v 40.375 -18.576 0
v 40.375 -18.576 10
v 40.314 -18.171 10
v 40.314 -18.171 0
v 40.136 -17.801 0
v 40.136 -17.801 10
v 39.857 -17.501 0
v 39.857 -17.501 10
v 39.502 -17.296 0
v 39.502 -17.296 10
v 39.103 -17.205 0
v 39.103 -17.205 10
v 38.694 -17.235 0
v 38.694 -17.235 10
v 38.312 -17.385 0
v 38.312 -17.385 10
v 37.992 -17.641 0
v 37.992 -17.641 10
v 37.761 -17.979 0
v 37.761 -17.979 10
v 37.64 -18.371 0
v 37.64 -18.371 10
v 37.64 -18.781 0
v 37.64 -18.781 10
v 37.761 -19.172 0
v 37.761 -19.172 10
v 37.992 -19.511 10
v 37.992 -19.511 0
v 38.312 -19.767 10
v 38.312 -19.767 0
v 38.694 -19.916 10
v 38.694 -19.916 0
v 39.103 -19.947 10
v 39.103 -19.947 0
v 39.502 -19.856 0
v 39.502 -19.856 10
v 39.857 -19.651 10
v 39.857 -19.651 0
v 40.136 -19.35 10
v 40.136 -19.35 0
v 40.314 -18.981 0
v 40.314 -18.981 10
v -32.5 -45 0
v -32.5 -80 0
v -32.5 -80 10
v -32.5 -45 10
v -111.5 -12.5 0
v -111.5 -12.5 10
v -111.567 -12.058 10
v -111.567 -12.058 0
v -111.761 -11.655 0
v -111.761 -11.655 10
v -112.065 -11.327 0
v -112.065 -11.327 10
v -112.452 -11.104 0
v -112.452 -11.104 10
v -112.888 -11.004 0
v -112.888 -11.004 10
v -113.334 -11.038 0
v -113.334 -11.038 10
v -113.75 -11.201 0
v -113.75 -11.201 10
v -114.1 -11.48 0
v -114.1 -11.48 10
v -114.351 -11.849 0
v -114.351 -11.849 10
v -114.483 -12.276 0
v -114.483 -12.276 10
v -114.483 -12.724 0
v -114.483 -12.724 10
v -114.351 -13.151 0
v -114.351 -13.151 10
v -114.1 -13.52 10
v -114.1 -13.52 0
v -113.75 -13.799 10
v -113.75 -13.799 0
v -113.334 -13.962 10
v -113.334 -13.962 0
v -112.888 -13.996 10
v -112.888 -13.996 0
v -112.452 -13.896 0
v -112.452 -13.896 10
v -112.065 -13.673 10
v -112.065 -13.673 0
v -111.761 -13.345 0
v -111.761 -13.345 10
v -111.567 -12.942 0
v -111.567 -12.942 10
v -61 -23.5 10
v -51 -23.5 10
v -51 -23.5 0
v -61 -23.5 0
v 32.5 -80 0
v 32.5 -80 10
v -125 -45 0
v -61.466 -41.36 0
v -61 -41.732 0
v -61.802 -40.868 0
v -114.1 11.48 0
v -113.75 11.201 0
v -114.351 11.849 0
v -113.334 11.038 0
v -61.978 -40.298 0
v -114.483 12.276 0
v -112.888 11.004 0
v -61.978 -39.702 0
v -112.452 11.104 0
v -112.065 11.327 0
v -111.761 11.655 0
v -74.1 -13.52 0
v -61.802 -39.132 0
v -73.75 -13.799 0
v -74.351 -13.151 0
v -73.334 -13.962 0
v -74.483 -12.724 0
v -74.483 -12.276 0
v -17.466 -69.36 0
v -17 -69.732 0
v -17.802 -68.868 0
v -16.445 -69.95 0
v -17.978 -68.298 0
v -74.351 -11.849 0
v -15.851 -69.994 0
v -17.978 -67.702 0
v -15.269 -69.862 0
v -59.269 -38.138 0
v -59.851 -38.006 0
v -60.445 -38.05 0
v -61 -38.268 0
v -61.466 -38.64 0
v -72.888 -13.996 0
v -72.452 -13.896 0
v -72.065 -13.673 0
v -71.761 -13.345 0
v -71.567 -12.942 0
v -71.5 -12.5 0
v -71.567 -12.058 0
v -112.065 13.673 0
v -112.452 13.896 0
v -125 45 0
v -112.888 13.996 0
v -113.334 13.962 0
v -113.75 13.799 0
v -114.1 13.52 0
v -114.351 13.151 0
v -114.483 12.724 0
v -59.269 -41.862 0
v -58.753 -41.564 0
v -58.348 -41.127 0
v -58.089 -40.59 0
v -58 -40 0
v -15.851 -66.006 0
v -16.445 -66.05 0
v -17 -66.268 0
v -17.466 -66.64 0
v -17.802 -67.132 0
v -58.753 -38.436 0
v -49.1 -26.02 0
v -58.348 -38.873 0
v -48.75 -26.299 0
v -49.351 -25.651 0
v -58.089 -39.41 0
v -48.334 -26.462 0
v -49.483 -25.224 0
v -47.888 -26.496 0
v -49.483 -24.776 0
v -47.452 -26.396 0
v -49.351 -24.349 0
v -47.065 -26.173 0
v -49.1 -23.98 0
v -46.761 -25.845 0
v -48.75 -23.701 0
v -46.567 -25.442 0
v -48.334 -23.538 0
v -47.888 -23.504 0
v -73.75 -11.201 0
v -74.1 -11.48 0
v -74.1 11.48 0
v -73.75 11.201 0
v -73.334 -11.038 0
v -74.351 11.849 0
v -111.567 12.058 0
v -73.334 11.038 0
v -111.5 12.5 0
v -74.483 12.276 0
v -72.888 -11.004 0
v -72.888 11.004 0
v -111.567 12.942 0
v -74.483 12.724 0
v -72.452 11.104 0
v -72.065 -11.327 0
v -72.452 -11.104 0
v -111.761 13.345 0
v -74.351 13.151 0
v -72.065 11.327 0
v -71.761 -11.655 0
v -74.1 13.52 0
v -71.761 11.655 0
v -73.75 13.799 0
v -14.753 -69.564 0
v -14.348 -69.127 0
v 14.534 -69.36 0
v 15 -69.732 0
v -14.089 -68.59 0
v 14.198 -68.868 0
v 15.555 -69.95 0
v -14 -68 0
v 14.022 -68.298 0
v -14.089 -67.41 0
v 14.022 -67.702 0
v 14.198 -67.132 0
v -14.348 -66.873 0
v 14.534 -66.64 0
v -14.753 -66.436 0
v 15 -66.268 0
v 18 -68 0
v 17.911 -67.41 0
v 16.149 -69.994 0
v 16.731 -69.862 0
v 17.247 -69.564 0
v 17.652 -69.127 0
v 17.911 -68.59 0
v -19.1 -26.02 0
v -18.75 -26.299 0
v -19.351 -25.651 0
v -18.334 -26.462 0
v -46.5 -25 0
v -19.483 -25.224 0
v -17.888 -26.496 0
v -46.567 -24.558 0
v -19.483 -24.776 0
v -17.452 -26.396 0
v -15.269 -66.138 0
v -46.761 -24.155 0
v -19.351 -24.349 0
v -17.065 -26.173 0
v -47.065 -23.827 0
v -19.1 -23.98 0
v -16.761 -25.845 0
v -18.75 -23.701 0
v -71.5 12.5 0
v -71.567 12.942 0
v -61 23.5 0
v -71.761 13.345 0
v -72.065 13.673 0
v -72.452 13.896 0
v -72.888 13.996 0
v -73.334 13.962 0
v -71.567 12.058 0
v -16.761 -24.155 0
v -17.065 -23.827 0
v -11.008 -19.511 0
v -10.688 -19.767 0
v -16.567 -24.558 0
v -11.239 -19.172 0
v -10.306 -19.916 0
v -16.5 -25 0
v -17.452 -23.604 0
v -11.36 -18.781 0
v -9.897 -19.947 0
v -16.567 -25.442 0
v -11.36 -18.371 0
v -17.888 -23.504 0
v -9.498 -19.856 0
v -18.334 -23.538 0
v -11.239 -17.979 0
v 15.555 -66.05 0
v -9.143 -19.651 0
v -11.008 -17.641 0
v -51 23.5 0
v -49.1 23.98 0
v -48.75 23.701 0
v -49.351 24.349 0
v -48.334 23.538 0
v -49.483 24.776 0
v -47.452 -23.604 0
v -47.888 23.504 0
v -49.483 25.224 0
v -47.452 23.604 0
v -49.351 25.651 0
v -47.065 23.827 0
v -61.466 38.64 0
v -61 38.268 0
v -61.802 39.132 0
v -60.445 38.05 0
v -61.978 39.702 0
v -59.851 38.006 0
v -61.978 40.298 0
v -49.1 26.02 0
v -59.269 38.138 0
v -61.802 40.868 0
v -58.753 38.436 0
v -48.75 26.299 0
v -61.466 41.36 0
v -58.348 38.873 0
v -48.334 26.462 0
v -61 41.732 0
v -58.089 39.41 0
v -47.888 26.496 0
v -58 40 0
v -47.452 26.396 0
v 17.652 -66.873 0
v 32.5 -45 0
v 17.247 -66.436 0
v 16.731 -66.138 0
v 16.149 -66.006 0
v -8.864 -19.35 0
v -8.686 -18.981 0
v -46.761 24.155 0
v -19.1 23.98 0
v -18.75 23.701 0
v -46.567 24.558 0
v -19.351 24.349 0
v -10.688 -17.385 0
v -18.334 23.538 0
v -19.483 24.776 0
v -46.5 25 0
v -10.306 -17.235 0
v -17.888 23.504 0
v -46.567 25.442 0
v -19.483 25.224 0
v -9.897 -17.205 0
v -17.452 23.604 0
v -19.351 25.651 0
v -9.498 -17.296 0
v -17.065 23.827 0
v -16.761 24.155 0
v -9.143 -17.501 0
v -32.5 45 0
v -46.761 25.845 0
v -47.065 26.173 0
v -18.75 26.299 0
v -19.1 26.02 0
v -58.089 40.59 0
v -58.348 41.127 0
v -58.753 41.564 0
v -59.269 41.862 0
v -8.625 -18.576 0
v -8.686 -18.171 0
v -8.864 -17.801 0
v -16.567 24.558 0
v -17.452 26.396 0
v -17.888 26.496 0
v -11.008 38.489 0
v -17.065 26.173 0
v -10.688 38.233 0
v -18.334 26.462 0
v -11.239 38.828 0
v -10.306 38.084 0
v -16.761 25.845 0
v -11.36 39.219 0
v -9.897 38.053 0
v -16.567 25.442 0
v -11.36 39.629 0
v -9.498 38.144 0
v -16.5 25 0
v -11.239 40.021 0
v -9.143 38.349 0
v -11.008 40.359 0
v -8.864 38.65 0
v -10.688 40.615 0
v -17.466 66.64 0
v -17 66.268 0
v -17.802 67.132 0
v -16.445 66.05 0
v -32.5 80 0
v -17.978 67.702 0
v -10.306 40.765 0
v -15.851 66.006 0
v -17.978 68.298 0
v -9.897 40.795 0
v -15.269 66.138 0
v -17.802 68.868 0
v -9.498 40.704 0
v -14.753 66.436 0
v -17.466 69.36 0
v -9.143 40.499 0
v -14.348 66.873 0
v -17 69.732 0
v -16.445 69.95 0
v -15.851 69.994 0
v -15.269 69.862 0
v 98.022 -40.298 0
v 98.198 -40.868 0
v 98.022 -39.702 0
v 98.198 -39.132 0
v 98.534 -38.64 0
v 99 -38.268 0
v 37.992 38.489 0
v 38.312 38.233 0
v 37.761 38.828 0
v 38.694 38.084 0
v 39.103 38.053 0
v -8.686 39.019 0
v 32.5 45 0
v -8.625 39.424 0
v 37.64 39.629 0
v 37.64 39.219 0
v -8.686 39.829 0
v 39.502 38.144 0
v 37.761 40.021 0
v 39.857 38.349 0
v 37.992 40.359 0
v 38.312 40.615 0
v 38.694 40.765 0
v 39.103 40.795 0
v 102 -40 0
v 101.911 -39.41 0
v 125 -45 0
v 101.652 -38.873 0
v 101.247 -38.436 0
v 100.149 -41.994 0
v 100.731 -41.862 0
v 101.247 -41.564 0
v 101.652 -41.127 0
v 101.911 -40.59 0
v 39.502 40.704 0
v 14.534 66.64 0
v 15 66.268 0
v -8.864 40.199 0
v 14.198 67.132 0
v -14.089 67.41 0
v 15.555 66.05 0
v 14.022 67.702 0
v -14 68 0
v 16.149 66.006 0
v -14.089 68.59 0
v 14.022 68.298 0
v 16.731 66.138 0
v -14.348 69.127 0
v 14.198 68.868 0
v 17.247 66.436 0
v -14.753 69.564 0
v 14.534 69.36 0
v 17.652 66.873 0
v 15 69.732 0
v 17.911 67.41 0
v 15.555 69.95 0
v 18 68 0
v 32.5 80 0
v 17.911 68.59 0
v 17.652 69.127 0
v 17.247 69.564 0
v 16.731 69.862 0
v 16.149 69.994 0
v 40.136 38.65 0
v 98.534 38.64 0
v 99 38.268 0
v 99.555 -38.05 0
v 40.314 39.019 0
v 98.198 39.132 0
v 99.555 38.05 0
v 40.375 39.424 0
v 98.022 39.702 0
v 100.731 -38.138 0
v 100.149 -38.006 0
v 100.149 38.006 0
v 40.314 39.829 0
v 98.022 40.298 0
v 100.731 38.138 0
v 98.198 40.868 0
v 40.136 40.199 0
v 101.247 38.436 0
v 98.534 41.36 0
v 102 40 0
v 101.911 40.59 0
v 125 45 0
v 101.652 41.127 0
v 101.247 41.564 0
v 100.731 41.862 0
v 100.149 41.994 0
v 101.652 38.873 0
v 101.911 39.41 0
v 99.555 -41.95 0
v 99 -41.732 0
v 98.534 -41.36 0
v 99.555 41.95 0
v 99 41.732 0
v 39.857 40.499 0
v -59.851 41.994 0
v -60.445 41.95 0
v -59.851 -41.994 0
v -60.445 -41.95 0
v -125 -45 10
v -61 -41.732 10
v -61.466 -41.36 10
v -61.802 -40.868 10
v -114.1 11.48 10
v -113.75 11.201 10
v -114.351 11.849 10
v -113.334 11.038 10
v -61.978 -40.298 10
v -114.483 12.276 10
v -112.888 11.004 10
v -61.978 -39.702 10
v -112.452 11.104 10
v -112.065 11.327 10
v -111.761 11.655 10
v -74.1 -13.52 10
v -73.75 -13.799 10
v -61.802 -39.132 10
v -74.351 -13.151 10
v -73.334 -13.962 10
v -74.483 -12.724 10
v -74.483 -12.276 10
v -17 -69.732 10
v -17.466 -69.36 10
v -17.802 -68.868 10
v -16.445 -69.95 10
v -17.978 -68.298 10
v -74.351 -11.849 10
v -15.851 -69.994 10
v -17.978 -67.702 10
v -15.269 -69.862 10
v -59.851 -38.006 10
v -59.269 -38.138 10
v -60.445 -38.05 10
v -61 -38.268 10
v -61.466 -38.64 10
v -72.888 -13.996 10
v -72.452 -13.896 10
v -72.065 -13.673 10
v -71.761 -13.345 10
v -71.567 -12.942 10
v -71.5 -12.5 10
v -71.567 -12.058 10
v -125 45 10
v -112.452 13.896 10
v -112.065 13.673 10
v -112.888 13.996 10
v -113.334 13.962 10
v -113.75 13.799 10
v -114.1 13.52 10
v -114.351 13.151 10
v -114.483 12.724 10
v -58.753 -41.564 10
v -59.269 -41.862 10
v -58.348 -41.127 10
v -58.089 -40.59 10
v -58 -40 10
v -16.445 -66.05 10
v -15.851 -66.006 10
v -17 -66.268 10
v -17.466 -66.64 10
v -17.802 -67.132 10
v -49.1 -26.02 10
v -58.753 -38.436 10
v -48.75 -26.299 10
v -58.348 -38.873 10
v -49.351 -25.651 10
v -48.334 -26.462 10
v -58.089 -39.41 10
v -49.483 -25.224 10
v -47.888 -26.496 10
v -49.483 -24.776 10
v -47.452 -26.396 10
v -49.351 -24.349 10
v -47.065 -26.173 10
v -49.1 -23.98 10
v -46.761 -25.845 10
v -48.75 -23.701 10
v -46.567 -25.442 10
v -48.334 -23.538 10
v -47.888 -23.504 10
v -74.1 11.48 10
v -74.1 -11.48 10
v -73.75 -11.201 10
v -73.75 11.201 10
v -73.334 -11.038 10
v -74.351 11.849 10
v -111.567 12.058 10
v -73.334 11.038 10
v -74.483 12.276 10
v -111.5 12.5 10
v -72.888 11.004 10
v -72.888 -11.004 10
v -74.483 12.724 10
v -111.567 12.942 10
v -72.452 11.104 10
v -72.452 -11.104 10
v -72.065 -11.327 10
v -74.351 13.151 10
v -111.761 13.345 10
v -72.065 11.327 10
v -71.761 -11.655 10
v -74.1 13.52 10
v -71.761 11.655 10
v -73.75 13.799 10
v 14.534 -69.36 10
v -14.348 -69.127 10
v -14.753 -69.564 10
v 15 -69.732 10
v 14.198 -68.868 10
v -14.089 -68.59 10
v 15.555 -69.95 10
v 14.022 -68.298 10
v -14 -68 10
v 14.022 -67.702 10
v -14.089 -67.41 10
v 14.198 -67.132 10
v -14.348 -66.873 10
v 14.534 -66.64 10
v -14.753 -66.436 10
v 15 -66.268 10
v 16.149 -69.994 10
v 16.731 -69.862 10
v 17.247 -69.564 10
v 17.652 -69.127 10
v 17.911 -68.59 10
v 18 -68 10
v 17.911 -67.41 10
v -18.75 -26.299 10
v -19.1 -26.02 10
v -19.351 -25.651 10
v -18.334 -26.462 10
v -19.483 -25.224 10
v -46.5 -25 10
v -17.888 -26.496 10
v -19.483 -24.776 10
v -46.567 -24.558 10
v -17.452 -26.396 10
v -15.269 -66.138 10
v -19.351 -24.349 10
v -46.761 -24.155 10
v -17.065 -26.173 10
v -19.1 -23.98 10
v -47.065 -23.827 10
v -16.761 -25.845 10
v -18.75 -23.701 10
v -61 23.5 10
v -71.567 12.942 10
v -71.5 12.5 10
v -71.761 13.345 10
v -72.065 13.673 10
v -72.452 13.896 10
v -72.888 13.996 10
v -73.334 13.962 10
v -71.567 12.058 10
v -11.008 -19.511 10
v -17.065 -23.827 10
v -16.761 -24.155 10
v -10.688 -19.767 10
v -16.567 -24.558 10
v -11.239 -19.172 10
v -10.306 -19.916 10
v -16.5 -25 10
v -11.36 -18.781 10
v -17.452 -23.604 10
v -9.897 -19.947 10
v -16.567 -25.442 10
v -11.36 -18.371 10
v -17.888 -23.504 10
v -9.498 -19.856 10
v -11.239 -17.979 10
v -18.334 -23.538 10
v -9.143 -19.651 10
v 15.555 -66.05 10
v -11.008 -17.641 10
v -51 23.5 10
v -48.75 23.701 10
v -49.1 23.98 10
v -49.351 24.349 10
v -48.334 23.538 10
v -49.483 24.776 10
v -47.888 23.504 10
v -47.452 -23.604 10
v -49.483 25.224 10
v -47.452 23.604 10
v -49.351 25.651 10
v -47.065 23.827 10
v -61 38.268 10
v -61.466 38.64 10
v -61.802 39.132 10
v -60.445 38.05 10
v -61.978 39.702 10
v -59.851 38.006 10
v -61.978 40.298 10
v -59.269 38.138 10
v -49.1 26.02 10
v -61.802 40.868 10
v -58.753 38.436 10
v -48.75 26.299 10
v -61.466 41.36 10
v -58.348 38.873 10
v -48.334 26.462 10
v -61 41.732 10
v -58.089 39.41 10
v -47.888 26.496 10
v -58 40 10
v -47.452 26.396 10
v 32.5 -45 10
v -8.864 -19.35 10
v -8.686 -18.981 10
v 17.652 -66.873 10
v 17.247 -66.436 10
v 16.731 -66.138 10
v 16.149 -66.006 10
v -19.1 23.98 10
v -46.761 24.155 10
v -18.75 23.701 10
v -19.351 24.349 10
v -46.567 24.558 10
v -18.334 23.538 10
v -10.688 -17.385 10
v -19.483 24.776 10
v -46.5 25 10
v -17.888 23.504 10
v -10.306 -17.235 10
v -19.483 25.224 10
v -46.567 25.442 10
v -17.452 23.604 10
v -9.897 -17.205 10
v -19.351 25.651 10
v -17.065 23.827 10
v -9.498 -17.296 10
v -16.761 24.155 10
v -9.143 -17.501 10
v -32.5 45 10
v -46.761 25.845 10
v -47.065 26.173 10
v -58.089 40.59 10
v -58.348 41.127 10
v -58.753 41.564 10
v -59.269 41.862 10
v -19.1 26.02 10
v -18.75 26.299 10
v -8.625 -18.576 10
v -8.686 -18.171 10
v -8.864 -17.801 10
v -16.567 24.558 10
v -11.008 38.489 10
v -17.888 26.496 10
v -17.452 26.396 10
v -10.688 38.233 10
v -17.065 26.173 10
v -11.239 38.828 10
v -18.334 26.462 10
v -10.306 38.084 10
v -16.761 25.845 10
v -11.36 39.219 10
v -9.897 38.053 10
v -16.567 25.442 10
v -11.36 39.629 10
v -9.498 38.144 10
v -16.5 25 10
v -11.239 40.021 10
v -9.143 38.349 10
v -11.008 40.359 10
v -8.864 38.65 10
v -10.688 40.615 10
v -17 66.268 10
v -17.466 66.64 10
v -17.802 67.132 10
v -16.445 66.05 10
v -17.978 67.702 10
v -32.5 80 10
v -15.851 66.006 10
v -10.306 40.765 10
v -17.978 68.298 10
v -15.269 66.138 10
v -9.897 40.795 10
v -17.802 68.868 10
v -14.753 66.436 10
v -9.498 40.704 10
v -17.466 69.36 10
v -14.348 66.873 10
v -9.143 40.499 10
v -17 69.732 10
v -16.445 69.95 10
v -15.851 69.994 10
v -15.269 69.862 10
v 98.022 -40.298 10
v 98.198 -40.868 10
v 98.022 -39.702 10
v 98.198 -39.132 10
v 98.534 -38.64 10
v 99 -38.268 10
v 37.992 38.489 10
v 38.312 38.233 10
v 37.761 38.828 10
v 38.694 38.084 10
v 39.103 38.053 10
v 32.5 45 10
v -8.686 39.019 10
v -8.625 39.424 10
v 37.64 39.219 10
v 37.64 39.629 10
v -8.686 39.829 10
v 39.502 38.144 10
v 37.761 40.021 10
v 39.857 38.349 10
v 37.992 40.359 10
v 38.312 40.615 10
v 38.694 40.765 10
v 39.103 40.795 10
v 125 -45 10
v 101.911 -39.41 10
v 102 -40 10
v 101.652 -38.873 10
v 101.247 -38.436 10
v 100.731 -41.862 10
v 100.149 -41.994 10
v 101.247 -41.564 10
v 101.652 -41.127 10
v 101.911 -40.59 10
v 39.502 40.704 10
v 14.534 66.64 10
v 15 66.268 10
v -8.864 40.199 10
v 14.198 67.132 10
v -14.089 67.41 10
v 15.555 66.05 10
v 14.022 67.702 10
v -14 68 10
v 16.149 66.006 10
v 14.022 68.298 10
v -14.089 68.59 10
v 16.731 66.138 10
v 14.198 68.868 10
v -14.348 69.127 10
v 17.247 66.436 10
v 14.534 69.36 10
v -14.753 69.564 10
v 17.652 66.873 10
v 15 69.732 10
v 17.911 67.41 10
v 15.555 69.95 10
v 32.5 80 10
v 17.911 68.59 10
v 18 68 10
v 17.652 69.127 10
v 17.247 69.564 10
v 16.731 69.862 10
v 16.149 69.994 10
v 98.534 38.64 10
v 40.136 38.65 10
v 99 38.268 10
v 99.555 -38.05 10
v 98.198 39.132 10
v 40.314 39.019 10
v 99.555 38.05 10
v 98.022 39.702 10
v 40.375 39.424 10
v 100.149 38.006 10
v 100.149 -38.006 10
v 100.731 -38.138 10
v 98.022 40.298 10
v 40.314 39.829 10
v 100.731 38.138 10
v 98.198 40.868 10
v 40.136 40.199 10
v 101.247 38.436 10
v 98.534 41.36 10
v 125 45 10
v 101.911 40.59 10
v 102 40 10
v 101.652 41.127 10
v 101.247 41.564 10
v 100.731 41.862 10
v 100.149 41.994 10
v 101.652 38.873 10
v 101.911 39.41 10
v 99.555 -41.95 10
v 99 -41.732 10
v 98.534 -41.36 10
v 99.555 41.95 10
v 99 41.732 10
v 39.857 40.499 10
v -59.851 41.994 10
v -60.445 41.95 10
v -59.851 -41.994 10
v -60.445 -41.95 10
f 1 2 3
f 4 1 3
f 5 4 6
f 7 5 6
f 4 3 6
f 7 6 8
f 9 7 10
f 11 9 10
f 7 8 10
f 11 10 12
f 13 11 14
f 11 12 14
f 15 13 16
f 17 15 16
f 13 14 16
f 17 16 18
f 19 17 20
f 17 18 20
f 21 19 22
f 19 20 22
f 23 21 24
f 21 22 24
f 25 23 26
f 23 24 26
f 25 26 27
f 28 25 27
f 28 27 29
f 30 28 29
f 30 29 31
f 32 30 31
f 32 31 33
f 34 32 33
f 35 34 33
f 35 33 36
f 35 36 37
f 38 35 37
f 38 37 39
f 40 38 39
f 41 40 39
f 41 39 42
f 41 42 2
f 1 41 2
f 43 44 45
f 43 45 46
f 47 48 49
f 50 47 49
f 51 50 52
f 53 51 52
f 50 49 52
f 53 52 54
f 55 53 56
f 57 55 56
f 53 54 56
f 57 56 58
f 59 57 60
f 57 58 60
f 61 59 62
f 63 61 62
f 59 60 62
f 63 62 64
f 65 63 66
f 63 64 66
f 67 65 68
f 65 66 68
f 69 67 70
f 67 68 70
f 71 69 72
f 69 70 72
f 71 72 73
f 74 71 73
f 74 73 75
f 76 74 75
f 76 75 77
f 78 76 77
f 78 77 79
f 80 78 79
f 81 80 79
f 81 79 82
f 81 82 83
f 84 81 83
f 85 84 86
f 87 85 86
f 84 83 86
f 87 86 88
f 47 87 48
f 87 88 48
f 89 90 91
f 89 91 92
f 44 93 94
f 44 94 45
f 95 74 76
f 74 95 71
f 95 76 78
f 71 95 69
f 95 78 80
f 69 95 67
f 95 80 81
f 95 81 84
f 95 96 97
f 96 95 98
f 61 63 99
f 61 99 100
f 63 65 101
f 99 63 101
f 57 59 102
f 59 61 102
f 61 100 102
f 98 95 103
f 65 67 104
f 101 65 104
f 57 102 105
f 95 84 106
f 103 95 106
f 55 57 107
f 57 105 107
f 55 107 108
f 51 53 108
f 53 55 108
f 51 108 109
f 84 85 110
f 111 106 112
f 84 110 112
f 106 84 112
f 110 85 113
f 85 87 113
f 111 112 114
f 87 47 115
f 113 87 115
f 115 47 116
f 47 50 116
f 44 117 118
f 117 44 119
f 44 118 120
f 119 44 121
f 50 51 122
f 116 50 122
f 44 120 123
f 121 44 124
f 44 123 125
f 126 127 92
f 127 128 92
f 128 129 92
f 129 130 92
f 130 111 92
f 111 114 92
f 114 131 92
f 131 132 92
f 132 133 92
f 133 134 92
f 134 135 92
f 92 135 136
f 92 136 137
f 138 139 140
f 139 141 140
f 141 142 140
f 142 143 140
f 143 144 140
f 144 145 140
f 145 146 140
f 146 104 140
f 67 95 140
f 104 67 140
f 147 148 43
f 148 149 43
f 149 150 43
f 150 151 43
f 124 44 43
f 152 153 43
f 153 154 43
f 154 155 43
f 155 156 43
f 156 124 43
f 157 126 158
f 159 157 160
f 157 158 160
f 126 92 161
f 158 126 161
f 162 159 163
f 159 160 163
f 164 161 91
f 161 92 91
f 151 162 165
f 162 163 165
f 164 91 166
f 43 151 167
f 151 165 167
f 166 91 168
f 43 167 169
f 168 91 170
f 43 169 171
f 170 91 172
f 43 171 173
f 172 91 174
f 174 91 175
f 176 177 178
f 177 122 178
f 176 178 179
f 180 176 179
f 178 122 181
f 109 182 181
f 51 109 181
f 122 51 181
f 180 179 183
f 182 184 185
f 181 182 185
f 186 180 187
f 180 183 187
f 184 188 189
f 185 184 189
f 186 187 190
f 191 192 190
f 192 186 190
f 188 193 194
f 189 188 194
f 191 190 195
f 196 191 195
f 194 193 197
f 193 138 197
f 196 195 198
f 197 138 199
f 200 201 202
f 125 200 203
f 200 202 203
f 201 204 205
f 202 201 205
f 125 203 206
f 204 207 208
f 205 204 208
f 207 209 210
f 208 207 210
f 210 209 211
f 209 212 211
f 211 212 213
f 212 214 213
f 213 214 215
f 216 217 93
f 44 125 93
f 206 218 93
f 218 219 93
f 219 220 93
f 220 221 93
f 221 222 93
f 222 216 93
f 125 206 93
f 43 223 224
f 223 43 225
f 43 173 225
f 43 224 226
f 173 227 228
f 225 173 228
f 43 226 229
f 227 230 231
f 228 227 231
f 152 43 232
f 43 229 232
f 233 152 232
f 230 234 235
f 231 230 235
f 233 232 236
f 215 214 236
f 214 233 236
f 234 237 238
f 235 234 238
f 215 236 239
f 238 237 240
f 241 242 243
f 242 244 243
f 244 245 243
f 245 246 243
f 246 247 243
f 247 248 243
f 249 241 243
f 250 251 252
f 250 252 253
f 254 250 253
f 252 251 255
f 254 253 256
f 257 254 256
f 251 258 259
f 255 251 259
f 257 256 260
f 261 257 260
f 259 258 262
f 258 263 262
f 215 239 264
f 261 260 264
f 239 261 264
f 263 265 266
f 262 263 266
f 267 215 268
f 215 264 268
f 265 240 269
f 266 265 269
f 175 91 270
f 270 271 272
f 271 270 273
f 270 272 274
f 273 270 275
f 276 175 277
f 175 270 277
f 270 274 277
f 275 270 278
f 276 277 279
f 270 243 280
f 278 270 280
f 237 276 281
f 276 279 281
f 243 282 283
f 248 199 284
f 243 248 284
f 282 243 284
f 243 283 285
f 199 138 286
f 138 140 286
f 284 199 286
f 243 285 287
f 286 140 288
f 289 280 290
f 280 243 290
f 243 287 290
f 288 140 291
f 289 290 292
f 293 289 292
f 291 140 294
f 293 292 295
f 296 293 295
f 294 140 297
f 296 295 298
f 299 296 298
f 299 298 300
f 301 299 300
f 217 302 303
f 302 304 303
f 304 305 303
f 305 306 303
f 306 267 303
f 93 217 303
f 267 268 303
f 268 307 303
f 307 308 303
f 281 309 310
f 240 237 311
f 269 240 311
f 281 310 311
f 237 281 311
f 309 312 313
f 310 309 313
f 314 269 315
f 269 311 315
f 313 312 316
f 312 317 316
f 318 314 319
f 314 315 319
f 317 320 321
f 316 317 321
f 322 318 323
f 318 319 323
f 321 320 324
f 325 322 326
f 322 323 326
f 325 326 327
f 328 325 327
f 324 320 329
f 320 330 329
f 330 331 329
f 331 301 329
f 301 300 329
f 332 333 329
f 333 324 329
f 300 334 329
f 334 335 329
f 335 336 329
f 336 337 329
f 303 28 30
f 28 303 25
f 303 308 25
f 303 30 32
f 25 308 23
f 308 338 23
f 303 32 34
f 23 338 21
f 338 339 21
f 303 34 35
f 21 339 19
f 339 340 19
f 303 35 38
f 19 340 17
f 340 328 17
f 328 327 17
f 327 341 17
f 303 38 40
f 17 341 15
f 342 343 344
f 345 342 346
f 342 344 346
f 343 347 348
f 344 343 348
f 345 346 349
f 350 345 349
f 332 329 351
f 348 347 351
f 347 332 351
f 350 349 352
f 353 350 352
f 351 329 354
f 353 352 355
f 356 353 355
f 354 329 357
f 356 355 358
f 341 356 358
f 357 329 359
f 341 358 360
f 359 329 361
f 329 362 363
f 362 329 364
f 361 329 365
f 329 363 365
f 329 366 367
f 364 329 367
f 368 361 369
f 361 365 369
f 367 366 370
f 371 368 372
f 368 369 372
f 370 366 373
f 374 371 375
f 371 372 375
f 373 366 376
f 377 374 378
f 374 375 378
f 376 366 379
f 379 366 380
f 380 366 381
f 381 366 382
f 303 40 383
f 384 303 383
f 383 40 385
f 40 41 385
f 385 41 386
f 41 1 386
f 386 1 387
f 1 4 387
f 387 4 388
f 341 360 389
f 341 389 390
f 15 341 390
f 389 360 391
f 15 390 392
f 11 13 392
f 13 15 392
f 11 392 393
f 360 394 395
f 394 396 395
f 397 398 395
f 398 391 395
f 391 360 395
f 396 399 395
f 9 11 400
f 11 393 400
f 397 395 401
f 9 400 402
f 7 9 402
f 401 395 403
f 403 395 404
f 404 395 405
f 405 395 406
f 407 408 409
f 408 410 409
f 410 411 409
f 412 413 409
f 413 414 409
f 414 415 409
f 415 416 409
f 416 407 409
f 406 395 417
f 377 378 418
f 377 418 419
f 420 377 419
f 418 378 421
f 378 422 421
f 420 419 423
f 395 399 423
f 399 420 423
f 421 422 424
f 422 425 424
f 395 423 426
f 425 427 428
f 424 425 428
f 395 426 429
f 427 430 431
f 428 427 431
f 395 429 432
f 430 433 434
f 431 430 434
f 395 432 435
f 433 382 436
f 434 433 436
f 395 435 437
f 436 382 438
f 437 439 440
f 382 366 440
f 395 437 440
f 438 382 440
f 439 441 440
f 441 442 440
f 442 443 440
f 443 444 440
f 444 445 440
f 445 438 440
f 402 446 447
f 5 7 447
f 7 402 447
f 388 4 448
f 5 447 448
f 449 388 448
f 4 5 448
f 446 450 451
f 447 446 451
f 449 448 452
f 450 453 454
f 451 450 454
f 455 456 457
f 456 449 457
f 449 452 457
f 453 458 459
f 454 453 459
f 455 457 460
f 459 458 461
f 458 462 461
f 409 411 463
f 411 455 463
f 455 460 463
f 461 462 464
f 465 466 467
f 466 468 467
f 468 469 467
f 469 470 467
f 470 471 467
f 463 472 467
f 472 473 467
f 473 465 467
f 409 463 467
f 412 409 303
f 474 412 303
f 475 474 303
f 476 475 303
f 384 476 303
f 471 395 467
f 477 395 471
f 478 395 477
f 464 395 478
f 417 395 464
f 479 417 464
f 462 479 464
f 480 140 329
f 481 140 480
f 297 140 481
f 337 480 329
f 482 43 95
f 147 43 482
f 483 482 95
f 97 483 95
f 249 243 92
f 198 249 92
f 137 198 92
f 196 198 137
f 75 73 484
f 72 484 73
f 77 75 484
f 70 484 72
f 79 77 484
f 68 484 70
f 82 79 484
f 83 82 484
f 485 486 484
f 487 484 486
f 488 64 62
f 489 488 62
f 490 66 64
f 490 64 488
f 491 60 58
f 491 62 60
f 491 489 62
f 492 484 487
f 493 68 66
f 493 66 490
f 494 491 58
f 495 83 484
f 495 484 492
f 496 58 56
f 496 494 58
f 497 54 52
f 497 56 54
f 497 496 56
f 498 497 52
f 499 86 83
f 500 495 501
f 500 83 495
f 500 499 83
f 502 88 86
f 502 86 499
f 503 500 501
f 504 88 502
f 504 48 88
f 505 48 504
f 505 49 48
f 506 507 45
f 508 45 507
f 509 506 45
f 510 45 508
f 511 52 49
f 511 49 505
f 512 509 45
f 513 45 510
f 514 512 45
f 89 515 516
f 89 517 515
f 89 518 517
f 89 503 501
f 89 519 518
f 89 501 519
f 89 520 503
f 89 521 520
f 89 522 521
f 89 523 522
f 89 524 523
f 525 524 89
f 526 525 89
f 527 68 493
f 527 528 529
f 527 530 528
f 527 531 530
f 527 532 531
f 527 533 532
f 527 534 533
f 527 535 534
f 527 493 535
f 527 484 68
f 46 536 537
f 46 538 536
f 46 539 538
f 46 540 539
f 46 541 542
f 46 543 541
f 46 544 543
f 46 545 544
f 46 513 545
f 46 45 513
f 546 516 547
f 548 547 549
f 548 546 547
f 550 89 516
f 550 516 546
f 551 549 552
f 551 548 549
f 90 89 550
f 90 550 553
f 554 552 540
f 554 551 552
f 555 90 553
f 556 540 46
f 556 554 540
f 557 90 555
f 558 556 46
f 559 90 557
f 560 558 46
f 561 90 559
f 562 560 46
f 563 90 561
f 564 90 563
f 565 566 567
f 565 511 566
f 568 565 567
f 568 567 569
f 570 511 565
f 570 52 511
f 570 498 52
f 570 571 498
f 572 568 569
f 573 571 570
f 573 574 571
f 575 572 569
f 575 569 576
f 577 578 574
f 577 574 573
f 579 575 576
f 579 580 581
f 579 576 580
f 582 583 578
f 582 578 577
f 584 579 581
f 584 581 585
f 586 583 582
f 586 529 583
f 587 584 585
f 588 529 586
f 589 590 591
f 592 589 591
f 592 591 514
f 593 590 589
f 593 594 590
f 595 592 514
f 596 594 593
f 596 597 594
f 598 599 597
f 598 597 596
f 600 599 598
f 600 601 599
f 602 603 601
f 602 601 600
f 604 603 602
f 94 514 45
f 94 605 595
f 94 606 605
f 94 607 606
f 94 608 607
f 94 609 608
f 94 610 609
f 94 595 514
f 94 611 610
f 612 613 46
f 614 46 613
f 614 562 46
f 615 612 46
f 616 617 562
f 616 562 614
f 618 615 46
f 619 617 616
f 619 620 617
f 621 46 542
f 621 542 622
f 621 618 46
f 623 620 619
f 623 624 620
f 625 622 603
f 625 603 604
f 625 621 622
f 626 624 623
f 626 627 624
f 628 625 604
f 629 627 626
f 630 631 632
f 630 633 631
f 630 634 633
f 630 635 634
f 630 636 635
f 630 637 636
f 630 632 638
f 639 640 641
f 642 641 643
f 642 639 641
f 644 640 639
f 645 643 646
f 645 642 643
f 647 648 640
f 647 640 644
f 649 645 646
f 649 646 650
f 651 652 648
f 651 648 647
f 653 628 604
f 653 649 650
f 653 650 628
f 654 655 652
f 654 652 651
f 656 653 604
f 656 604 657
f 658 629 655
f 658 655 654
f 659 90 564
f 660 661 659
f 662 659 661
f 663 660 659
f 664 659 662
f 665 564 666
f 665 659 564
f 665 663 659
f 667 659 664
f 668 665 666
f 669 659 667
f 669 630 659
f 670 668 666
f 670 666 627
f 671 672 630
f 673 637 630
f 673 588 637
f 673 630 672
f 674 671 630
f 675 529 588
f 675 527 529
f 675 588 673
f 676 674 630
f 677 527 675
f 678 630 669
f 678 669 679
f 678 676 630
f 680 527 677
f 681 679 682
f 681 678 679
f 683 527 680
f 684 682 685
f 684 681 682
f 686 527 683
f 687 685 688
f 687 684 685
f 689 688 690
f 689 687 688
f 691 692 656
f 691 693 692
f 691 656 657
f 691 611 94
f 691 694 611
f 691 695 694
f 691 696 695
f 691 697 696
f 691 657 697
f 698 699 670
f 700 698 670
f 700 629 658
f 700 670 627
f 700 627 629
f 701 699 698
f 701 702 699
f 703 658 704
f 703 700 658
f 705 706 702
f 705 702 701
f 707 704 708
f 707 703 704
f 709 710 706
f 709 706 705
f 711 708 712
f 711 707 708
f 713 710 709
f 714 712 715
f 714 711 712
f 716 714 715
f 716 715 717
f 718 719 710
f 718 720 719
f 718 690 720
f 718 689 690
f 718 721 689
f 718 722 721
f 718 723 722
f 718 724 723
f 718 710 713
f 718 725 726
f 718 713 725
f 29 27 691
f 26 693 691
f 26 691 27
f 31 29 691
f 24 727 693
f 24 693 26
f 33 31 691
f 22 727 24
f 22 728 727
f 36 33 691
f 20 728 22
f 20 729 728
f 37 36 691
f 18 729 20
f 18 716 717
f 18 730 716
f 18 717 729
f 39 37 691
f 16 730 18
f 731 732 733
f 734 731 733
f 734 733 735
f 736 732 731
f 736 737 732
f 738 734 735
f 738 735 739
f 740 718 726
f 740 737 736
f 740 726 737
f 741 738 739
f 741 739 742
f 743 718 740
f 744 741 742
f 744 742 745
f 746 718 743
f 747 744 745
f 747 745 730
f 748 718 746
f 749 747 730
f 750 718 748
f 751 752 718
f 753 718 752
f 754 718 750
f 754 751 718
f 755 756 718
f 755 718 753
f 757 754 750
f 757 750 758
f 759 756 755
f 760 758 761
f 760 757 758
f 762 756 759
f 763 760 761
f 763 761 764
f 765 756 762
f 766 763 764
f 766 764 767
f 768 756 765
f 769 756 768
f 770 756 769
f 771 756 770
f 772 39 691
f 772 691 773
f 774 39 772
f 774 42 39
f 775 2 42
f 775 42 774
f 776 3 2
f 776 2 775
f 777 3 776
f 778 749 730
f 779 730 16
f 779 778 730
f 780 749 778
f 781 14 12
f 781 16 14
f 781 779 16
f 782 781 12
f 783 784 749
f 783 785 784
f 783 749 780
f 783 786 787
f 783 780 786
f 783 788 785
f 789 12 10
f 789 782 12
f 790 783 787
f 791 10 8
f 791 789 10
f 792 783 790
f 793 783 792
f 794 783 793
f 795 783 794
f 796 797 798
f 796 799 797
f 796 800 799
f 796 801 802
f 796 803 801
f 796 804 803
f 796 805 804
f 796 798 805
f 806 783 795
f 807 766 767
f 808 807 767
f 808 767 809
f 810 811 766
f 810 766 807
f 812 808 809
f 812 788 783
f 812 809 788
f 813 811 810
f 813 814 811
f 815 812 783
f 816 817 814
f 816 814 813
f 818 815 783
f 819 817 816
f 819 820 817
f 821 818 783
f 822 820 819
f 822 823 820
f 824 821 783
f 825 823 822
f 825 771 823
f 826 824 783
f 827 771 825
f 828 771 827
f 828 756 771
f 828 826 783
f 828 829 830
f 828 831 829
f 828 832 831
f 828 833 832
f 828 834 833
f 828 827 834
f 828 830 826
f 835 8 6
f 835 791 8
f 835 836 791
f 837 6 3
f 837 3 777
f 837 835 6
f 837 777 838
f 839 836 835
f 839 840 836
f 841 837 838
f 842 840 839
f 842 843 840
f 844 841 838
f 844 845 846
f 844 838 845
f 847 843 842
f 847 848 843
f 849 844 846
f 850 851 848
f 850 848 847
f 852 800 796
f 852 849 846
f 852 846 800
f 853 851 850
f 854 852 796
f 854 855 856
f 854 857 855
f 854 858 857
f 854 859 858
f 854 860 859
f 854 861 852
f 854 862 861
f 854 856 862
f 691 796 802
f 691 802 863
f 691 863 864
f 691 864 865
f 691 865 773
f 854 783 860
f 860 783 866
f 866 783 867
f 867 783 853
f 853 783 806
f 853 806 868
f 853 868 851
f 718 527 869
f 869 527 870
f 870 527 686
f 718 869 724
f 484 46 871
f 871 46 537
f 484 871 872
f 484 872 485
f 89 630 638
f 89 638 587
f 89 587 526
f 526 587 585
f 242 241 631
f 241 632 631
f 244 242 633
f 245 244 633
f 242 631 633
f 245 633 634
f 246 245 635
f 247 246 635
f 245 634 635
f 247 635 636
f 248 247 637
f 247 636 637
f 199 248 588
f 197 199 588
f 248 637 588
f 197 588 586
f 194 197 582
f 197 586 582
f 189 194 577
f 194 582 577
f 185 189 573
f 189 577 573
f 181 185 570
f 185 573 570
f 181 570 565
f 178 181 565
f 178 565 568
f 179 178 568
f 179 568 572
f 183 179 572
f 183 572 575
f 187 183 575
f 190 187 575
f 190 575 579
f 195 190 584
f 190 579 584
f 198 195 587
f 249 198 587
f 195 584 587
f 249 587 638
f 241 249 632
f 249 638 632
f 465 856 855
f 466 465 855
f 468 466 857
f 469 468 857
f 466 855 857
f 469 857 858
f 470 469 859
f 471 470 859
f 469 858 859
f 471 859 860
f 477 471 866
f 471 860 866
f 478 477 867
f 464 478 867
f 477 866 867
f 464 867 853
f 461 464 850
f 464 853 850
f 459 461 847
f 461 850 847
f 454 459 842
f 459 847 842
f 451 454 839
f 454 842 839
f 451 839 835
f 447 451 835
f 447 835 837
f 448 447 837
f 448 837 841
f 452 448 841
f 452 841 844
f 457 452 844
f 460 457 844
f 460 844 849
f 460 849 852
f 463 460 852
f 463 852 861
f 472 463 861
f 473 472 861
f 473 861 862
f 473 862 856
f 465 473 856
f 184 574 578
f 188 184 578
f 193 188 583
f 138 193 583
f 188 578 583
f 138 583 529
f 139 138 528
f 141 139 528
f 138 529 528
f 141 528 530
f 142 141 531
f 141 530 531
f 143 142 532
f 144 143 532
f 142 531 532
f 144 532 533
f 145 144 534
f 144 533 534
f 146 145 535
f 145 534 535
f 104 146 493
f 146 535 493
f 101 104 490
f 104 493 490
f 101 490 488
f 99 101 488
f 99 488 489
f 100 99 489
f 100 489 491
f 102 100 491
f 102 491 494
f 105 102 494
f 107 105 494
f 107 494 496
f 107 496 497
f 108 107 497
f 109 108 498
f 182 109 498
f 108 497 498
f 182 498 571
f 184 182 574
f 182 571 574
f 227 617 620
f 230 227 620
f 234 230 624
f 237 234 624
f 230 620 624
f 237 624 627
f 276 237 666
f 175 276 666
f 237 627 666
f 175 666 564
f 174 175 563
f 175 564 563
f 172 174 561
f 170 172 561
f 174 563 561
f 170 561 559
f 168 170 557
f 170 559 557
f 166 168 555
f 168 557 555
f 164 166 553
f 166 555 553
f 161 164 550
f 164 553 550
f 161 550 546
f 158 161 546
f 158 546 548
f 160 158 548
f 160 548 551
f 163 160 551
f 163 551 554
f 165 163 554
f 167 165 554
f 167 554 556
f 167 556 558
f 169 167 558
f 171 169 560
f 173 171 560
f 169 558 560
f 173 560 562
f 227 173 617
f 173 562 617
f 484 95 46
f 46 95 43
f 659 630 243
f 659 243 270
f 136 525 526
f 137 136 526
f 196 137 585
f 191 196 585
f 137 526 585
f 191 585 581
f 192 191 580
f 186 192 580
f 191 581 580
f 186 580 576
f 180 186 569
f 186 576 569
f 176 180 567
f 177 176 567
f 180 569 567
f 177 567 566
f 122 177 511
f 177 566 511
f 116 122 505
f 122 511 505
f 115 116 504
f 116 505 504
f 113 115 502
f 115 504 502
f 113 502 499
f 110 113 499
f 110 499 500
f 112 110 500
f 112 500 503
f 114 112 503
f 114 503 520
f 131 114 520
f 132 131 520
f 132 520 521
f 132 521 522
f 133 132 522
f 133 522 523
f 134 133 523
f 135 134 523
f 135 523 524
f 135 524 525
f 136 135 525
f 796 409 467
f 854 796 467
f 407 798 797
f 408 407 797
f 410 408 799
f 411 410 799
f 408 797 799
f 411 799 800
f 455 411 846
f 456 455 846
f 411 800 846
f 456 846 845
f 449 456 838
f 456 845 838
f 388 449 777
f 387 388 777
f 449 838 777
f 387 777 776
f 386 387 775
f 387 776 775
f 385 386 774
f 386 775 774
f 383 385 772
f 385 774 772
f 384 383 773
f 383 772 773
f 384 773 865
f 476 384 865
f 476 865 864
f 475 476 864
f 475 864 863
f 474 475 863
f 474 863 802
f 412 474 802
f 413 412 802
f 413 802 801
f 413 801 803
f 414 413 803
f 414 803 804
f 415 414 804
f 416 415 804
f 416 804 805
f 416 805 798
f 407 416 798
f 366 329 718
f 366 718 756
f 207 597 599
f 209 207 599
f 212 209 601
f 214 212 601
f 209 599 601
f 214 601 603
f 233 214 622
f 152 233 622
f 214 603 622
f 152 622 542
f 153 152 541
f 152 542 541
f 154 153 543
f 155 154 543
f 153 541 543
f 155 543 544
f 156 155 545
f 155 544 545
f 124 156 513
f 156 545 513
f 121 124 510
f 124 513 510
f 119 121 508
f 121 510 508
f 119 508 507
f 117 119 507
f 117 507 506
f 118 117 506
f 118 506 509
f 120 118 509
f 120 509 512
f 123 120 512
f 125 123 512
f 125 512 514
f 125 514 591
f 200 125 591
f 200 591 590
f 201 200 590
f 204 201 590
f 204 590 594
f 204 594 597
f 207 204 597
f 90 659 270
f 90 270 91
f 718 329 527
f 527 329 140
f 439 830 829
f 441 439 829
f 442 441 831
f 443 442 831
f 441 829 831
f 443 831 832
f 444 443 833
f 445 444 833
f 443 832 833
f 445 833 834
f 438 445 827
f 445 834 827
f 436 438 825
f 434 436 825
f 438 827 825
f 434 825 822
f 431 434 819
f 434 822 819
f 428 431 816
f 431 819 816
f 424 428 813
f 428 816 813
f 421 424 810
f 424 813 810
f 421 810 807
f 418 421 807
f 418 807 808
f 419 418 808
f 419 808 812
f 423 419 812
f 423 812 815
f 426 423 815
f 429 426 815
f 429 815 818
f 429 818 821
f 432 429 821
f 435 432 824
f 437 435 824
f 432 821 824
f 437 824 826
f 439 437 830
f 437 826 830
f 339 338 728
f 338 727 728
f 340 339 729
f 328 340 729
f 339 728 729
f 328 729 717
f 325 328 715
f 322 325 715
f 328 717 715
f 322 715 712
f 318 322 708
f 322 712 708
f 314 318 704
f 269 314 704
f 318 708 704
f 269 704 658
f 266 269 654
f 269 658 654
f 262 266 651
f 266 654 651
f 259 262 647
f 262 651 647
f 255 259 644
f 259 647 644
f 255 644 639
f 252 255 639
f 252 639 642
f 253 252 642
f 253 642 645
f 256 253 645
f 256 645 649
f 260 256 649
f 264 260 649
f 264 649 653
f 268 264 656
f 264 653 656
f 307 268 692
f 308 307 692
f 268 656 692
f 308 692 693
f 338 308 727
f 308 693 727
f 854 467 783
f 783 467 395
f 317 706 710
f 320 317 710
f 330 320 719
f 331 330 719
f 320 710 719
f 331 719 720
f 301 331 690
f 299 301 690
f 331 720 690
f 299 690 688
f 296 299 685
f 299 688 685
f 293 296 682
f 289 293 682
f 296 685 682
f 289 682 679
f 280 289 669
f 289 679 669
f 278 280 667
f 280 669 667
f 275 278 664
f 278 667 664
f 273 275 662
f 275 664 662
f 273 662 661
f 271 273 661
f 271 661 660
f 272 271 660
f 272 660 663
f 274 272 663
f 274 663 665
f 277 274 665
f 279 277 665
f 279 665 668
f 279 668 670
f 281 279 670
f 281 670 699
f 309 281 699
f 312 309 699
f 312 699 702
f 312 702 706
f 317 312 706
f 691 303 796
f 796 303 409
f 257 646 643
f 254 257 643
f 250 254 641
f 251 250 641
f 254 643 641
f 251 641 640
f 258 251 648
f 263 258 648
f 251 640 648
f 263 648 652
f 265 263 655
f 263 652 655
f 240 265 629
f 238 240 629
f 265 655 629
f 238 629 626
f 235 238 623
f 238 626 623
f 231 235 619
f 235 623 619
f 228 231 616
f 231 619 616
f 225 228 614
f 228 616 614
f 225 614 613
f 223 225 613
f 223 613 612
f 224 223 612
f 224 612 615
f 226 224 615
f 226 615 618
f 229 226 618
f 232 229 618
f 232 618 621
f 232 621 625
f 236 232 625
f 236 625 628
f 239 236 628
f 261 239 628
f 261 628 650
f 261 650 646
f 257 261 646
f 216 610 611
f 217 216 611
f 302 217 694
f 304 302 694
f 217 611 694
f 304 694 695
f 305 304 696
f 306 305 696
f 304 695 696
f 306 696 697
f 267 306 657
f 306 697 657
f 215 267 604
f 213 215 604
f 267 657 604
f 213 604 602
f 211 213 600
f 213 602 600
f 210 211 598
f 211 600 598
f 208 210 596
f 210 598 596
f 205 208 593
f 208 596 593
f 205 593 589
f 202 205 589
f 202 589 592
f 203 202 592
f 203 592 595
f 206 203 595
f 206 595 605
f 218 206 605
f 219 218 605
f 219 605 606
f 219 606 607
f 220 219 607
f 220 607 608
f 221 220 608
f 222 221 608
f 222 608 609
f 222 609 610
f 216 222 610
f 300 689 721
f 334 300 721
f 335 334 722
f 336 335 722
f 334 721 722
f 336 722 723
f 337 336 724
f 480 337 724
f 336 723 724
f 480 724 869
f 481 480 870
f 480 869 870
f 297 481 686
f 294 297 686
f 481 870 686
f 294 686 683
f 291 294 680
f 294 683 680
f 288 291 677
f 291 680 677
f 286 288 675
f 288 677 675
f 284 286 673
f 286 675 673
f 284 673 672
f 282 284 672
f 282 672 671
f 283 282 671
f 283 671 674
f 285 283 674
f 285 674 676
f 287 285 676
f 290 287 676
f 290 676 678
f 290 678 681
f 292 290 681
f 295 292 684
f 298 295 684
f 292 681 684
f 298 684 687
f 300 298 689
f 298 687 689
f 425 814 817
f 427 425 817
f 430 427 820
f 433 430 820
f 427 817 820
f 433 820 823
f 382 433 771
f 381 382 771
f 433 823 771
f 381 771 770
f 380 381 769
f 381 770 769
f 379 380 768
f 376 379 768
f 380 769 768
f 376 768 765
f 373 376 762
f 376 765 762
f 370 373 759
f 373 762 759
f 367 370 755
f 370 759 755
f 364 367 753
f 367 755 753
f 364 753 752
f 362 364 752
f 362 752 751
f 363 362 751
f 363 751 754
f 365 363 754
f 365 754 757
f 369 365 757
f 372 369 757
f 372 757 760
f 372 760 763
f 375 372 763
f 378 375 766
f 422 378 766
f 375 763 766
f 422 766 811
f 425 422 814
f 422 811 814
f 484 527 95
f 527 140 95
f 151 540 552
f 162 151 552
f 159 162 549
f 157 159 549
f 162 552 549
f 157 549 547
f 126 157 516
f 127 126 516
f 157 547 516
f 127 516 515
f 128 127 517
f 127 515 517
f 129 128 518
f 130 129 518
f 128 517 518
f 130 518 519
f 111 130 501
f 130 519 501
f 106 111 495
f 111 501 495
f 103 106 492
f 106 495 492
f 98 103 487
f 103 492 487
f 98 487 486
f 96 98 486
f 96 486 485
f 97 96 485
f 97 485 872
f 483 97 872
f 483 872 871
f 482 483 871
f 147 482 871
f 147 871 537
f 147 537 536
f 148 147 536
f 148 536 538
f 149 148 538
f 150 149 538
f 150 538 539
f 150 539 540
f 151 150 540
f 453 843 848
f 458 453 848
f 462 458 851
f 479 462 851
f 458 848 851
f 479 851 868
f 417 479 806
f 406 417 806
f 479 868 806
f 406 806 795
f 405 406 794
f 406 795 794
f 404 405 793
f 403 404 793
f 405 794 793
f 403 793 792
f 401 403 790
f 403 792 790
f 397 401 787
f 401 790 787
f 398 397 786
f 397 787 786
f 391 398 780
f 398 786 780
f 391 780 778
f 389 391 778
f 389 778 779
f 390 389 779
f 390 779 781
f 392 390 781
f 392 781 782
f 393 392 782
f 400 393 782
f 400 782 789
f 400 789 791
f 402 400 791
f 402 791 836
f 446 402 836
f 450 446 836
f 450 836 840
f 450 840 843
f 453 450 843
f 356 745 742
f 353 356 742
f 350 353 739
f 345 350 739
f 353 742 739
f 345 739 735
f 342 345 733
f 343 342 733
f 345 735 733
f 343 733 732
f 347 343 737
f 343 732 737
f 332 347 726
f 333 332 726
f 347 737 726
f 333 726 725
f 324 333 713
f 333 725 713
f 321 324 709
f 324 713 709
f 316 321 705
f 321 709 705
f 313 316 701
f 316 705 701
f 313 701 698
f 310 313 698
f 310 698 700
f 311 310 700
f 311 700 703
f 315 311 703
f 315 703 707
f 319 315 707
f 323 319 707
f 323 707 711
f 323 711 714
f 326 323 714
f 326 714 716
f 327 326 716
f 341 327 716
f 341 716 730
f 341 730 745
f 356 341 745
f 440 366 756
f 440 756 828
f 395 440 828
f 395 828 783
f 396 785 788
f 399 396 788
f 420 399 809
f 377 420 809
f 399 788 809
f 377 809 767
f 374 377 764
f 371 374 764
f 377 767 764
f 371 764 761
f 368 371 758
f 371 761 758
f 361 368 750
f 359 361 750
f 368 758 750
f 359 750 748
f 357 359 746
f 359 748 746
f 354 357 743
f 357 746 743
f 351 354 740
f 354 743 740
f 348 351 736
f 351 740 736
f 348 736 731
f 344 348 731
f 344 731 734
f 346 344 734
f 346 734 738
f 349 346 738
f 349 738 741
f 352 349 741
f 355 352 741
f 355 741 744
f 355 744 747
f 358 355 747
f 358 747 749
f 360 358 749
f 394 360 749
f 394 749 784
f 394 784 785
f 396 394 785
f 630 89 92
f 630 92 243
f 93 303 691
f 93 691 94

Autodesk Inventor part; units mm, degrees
ref_plane "YZ Plane" through (0, 0, 0) normal (1, 0, 0) x (0, 1, 0)
ref_plane "XZ Plane" through (0, 0, 0) normal (0, 1, 0) x (-1, 0, 0)
ref_plane "XY Plane" through (0, 0, 0) normal (0, 0, 1) x (1, 0, 0)
sketch "Эскиз1" plane through (0, 0, 0) normal (0, 0, 1) x (1, 0, 0)
  line L0 (-125, -45) -> (125, -45)
  line L1 (125, -45) -> (125, 45)
  line L2 (125, 45) -> (-125, 45)
  line L3 (-125, 45) -> (-125, -45)
  line L4 (-125, -45) -> (125, 45) construction
  line L5 (125, -45) -> (-125, 45) construction
  line L6 (32.5, -80) -> (-32.5, -80)
  line L7 (-32.5, -80) -> (-32.5, 80)
  line L8 (-32.5, 80) -> (32.5, 80)
  line L9 (32.5, 80) -> (32.5, -80)
  line L10 (32.5, -80) -> (-32.5, 80) construction
  line L11 (-32.5, -80) -> (32.5, 80) construction
  point P0 (0, 0)
  dimension "d0" = 250
  dimension "d1" = 90
  dimension "d2" = 65
  dimension "d3" = 160
extrude "Выдавливание1" add sketch "Эскиз1" along normal blind 10
sketch "Эскиз2" plane through (0, 0, 10) normal (0, 0, 1) x (1, 0, 0)
  line L0 (16, 68) -> (-16, 68) construction
  line L1 (-16, 68) -> (-16, 80) construction
  line L2 (-16, 80) -> (16, 80) construction
  line L3 (16, 80) -> (16, 68) construction
  line L4 (16, 68) -> (-16, 80) construction
  line L5 (-16, 68) -> (16, 80) construction
  line L6 (0, 0) -> (16, 0) construction
  line L7 (16, -68) -> (-16, -68) construction
  line L8 (-16, -68) -> (-16, -80) construction
  line L9 (-16, -80) -> (16, -80) construction
  line L10 (16, -80) -> (16, -68) construction
  line L11 (16, -68) -> (-16, -80) construction
  line L12 (-16, -68) -> (16, -80) construction
  circle A0 centre (-16, 68) radius 2
  circle A1 centre (16, 68) radius 2
  circle A2 centre (-16, -68) radius 2
  circle A3 centre (16, -68) radius 2
  point P0 (0, 74)
  point P1 (-32.5, 80)
  point P2 (0, 74)
  point P3 (0, 74)
  point P4 (0, -74)
  point P5 (-32.5, -80)
  point P6 (0, -74)
  point P7 (0, -74)
  dimension "d6" = 32
  dimension "d7" = 12
  dimension "d8" = 4
  dimension "d9" = 4
  dimension "d10" = 4
  dimension "d11" = 4
extrude "Выдавливание2" cut sketch "Эскиз2" against normal blind 10
sketch "Эскиз3" plane through (0, 0, 10) normal (0, 0, 1) x (1, 0, 0)
  line L0 (100, -40) -> (-60, -40) construction
  line L1 (-60, -40) -> (-60, 40) construction
  line L2 (-60, 40) -> (100, 40) construction
  line L3 (100, 40) -> (100, -40) construction
  line L4 (100, -40) -> (-60, 40) construction
  line L5 (-60, -40) -> (100, 40) construction
  line L6 (125, -45) -> (125, 45) construction
  circle A0 centre (100, 40) radius 2
  circle A1 centre (100, -40) radius 2
  circle A2 centre (-60, -40) radius 2
  circle A3 centre (-60, 40) radius 2
  point P0 (0, 0)
  point P1 (20, 0)
  point P2 (20, 0)
  dimension "d14" = 160
  dimension "d15" = 80
  dimension "d16" = 25
  dimension "d17" = 4
  dimension "d18" = 4
  dimension "d19" = 4
  dimension "d20" = 4
extrude "Выдавливание3" cut sketch "Эскиз3" against normal blind 10
sketch "Эскиз4" plane through (0, 0, 10) normal (0, 0, 1) x (1, 0, 0)
  line L0 (-113, -12.5) -> (-73, -12.5) construction
  line L1 (-73, -12.5) -> (-73, 12.5) construction
  line L2 (-73, 12.5) -> (-113, 12.5) construction
  line L3 (-113, 12.5) -> (-113, -12.5) construction
  line L4 (-113, -12.5) -> (-73, 12.5) construction
  line L5 (-73, -12.5) -> (-113, 12.5) construction
  line L6 (-125, 45) -> (-125, -45) construction
  circle A0 centre (-113, 12.5) radius 1.5
  circle A1 centre (-73, 12.5) radius 1.5
  circle A2 centre (-73, -12.5) radius 1.5
  circle A3 centre (-113, -12.5) radius 1.5
  point P0 (0, 0)
  point P1 (-93, 0)
  point P2 (-93, 0)
  dimension "d23" = 40
  dimension "d24" = 25
  dimension "d25" = 12
  dimension "d26" = 3
  dimension "d27" = 3
  dimension "d28" = 3
  dimension "d29" = 3
extrude "Выдавливание4" cut sketch "Эскиз4" against normal blind 10
sketch "Эскиз5" plane through (0, 0, 10) normal (0, 0, 1) x (1, 0, 0)
  line L0 (-51, -23.5) -> (-61, -23.5)
  line L1 (-61, -23.5) -> (-61, 23.5)
  line L2 (-61, 23.5) -> (-51, 23.5)
  line L3 (-51, 23.5) -> (-51, -23.5)
  line L4 (-51, -23.5) -> (-61, 23.5) construction
  line L5 (-61, -23.5) -> (-51, 23.5) construction
  circle A0 centre (-73, 12.5) radius 1.5 projected
  point P0 (0, 0)
  point P1 (-56, 0)
  point P2 (-56, 0)
  dimension "d32" = 10
  dimension "d33" = 47
  dimension "d34" = 12
extrude "Выдавливание5" cut sketch "Эскиз5" against normal blind 10 contours L0 L1 L2 L3
sketch "Эскиз6" plane through (0, 0, 10) normal (0, 0, 1) x (1, 0, 0)
  line L0 (-18, -25) -> (-48, -25) construction
  line L1 (-48, -25) -> (-48, 25) construction
  line L2 (-48, 25) -> (-18, 25) construction
  line L3 (-18, 25) -> (-18, -25) construction
  line L4 (-18, -25) -> (-48, 25) construction
  line L5 (-48, -25) -> (-18, 25) construction
  line L6 (-51, 23.5) -> (-51, -23.5) construction
  circle A0 centre (-48, 25) radius 1.5
  circle A1 centre (-18, 25) radius 1.5
  circle A2 centre (-18, -25) radius 1.5
  circle A3 centre (-48, -25) radius 1.5
  point P0 (0, 0)
  point P1 (-33, 0)
  point P2 (-33, 0)
  dimension "d37" = 30
  dimension "d38" = 50
  dimension "d39" = 3
  dimension "d40" = 3
  dimension "d41" = 3
  dimension "d42" = 3
  dimension "d43" = 3
extrude "Выдавливание6" cut sketch "Эскиз6" against normal blind 10
sketch "Эскиз7" plane through (0, 0, 10) normal (0, 0, 1) x (1, 0, 0)
  circle A0 centre (-10, -18.5758) radius 1.375 projected
  circle A1 centre (39, -18.5758) radius 1.375 projected
  circle A2 centre (39, 39.4242) radius 1.375 projected
  circle A3 centre (-10, 39.4242) radius 1.375 projected
  point P0 (0, 0)
extrude "Выдавливание7" cut sketch "Эскиз7" against normal blind 10
properties part number "Основная пластина платформы"
